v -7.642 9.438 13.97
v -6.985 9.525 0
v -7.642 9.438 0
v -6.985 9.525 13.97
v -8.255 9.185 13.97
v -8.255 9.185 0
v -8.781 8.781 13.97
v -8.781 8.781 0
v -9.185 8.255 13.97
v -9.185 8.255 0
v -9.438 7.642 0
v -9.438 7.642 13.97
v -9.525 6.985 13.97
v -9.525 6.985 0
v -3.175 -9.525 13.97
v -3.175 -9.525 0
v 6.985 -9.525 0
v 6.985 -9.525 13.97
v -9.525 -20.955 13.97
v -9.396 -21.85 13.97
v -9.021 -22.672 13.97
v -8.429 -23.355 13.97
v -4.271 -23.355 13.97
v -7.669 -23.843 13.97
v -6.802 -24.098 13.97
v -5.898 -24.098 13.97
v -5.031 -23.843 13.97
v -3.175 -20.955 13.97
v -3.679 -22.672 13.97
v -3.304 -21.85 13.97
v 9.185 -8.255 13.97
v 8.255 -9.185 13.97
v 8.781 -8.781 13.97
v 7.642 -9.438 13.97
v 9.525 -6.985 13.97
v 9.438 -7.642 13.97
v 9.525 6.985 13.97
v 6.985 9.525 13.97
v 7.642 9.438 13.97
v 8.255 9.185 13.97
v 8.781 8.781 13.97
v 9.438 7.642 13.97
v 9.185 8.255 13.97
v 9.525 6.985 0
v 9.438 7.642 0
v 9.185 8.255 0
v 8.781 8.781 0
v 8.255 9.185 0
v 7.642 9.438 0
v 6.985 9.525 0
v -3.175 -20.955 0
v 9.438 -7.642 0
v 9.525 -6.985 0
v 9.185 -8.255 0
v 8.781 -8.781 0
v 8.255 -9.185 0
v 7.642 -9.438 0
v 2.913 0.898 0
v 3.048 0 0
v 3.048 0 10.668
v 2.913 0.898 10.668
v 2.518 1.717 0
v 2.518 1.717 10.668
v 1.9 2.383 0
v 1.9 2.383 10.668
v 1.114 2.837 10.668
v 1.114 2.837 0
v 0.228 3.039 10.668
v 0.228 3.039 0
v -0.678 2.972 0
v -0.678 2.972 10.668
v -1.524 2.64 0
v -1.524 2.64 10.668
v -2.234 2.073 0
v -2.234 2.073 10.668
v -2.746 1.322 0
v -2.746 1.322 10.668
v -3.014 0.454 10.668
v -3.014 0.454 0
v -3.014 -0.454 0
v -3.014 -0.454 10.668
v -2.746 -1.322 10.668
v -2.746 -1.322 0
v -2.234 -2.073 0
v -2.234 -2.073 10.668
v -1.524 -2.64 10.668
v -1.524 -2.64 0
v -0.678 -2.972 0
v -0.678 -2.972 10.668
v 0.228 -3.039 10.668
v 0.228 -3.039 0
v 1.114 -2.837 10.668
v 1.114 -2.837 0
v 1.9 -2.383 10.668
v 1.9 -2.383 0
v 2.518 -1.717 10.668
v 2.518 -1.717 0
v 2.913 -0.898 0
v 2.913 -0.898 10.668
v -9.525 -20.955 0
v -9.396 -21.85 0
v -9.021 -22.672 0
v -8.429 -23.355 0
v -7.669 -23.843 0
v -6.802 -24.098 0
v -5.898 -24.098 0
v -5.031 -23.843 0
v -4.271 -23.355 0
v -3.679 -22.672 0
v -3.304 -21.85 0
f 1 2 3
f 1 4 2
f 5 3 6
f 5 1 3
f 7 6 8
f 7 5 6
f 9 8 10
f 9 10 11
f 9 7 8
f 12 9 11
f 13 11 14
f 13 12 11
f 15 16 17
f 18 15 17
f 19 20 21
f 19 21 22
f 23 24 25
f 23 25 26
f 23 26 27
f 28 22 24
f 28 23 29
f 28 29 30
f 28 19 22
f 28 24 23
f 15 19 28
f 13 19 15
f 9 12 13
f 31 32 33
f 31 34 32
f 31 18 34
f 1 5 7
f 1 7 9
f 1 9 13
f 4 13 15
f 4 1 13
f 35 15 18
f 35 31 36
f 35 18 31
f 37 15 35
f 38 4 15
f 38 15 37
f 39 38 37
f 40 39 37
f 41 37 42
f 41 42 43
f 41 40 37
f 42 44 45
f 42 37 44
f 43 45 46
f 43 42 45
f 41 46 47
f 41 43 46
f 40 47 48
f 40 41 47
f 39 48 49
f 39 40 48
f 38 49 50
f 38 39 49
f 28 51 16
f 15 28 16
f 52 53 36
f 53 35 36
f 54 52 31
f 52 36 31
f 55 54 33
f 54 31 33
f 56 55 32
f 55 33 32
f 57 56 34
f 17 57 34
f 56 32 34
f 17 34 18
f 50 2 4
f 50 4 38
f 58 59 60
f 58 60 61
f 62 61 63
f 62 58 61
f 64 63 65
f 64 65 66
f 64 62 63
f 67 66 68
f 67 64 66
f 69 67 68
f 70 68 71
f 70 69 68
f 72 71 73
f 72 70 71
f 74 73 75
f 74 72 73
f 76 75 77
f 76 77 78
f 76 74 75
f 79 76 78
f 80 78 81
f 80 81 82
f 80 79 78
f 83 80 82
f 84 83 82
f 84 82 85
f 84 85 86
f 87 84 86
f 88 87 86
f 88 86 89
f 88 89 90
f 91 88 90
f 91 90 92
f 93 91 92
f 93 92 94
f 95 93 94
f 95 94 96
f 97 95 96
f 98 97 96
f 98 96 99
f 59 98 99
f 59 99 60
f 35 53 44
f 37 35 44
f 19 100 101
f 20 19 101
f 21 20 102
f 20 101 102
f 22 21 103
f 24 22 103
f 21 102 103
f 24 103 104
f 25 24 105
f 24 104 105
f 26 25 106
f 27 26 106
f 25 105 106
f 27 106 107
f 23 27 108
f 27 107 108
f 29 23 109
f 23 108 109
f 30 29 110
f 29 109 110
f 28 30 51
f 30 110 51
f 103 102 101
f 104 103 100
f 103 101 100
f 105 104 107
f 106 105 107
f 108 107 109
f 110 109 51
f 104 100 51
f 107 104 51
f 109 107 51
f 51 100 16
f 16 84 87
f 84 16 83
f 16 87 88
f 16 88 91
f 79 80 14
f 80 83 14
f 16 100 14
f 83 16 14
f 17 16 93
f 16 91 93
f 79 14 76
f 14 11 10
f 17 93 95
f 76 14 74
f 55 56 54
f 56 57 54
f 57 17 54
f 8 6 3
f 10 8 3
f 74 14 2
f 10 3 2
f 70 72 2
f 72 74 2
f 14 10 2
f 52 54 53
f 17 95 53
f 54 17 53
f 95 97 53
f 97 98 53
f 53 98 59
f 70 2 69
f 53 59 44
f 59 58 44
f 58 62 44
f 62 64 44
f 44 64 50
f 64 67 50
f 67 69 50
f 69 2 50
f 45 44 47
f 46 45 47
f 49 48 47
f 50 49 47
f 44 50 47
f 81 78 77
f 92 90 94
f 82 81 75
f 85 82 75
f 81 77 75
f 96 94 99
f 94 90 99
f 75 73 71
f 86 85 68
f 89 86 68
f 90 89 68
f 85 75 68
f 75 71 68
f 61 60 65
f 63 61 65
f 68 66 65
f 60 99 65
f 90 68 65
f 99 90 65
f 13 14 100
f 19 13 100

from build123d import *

# Parameters (mm, degrees)
F0_R     = 3.048
F0_W     = 19.05
F0_H     = 3.302
F1_DEPTH = 13.97
F2_R     = 2.54
F3_R     = 3.048
F4_DEPTH = 3.302
F5_DEPTH = 13.97


with BuildPart() as f1:
    # F0 (on Top) → F1 (new body)
    with BuildSketch(Plane.XY):
        Polygon((9.525, 6.223), (-9.525, 6.223), (-9.525, -9.525), (-3.175, -9.525), (9.525, -9.525), align=None)
        Circle(F0_R, mode=Mode.SUBTRACT)
        with Locations((0, 7.874)):
            Rectangle(F0_W, F0_H)
    extrude(amount=F1_DEPTH)

    # F2
    f2_edges = [f1.edges().sort_by_distance(p)[0] for p in [
        (9.525, 9.525, 6.985),
        (-9.525, 9.525, 6.985),
        (9.525, -9.525, 6.985),
    ]]
    fillet(f2_edges, radius=F2_R)

    # F3 (on face) → F4 (join)
    with BuildSketch(Plane.XY.offset(13.97)):
        Circle(F3_R)
    extrude(amount=-F4_DEPTH)

    # F0 (on Top) → F5 (join, through all)
    with BuildSketch(Plane.XY):
        with BuildLine():
            Line((-3.175, -9.525), (-9.525, -9.525))
            Line((-9.525, -9.525), (-9.525, -20.955))
            ThreePointArc((-9.525, -20.955), (-6.35, -24.13), (-3.175, -20.955))
            Line((-3.175, -20.955), (-3.175, -9.525))
        make_face()
    extrude(amount=F5_DEPTH)


solid = f1.part
